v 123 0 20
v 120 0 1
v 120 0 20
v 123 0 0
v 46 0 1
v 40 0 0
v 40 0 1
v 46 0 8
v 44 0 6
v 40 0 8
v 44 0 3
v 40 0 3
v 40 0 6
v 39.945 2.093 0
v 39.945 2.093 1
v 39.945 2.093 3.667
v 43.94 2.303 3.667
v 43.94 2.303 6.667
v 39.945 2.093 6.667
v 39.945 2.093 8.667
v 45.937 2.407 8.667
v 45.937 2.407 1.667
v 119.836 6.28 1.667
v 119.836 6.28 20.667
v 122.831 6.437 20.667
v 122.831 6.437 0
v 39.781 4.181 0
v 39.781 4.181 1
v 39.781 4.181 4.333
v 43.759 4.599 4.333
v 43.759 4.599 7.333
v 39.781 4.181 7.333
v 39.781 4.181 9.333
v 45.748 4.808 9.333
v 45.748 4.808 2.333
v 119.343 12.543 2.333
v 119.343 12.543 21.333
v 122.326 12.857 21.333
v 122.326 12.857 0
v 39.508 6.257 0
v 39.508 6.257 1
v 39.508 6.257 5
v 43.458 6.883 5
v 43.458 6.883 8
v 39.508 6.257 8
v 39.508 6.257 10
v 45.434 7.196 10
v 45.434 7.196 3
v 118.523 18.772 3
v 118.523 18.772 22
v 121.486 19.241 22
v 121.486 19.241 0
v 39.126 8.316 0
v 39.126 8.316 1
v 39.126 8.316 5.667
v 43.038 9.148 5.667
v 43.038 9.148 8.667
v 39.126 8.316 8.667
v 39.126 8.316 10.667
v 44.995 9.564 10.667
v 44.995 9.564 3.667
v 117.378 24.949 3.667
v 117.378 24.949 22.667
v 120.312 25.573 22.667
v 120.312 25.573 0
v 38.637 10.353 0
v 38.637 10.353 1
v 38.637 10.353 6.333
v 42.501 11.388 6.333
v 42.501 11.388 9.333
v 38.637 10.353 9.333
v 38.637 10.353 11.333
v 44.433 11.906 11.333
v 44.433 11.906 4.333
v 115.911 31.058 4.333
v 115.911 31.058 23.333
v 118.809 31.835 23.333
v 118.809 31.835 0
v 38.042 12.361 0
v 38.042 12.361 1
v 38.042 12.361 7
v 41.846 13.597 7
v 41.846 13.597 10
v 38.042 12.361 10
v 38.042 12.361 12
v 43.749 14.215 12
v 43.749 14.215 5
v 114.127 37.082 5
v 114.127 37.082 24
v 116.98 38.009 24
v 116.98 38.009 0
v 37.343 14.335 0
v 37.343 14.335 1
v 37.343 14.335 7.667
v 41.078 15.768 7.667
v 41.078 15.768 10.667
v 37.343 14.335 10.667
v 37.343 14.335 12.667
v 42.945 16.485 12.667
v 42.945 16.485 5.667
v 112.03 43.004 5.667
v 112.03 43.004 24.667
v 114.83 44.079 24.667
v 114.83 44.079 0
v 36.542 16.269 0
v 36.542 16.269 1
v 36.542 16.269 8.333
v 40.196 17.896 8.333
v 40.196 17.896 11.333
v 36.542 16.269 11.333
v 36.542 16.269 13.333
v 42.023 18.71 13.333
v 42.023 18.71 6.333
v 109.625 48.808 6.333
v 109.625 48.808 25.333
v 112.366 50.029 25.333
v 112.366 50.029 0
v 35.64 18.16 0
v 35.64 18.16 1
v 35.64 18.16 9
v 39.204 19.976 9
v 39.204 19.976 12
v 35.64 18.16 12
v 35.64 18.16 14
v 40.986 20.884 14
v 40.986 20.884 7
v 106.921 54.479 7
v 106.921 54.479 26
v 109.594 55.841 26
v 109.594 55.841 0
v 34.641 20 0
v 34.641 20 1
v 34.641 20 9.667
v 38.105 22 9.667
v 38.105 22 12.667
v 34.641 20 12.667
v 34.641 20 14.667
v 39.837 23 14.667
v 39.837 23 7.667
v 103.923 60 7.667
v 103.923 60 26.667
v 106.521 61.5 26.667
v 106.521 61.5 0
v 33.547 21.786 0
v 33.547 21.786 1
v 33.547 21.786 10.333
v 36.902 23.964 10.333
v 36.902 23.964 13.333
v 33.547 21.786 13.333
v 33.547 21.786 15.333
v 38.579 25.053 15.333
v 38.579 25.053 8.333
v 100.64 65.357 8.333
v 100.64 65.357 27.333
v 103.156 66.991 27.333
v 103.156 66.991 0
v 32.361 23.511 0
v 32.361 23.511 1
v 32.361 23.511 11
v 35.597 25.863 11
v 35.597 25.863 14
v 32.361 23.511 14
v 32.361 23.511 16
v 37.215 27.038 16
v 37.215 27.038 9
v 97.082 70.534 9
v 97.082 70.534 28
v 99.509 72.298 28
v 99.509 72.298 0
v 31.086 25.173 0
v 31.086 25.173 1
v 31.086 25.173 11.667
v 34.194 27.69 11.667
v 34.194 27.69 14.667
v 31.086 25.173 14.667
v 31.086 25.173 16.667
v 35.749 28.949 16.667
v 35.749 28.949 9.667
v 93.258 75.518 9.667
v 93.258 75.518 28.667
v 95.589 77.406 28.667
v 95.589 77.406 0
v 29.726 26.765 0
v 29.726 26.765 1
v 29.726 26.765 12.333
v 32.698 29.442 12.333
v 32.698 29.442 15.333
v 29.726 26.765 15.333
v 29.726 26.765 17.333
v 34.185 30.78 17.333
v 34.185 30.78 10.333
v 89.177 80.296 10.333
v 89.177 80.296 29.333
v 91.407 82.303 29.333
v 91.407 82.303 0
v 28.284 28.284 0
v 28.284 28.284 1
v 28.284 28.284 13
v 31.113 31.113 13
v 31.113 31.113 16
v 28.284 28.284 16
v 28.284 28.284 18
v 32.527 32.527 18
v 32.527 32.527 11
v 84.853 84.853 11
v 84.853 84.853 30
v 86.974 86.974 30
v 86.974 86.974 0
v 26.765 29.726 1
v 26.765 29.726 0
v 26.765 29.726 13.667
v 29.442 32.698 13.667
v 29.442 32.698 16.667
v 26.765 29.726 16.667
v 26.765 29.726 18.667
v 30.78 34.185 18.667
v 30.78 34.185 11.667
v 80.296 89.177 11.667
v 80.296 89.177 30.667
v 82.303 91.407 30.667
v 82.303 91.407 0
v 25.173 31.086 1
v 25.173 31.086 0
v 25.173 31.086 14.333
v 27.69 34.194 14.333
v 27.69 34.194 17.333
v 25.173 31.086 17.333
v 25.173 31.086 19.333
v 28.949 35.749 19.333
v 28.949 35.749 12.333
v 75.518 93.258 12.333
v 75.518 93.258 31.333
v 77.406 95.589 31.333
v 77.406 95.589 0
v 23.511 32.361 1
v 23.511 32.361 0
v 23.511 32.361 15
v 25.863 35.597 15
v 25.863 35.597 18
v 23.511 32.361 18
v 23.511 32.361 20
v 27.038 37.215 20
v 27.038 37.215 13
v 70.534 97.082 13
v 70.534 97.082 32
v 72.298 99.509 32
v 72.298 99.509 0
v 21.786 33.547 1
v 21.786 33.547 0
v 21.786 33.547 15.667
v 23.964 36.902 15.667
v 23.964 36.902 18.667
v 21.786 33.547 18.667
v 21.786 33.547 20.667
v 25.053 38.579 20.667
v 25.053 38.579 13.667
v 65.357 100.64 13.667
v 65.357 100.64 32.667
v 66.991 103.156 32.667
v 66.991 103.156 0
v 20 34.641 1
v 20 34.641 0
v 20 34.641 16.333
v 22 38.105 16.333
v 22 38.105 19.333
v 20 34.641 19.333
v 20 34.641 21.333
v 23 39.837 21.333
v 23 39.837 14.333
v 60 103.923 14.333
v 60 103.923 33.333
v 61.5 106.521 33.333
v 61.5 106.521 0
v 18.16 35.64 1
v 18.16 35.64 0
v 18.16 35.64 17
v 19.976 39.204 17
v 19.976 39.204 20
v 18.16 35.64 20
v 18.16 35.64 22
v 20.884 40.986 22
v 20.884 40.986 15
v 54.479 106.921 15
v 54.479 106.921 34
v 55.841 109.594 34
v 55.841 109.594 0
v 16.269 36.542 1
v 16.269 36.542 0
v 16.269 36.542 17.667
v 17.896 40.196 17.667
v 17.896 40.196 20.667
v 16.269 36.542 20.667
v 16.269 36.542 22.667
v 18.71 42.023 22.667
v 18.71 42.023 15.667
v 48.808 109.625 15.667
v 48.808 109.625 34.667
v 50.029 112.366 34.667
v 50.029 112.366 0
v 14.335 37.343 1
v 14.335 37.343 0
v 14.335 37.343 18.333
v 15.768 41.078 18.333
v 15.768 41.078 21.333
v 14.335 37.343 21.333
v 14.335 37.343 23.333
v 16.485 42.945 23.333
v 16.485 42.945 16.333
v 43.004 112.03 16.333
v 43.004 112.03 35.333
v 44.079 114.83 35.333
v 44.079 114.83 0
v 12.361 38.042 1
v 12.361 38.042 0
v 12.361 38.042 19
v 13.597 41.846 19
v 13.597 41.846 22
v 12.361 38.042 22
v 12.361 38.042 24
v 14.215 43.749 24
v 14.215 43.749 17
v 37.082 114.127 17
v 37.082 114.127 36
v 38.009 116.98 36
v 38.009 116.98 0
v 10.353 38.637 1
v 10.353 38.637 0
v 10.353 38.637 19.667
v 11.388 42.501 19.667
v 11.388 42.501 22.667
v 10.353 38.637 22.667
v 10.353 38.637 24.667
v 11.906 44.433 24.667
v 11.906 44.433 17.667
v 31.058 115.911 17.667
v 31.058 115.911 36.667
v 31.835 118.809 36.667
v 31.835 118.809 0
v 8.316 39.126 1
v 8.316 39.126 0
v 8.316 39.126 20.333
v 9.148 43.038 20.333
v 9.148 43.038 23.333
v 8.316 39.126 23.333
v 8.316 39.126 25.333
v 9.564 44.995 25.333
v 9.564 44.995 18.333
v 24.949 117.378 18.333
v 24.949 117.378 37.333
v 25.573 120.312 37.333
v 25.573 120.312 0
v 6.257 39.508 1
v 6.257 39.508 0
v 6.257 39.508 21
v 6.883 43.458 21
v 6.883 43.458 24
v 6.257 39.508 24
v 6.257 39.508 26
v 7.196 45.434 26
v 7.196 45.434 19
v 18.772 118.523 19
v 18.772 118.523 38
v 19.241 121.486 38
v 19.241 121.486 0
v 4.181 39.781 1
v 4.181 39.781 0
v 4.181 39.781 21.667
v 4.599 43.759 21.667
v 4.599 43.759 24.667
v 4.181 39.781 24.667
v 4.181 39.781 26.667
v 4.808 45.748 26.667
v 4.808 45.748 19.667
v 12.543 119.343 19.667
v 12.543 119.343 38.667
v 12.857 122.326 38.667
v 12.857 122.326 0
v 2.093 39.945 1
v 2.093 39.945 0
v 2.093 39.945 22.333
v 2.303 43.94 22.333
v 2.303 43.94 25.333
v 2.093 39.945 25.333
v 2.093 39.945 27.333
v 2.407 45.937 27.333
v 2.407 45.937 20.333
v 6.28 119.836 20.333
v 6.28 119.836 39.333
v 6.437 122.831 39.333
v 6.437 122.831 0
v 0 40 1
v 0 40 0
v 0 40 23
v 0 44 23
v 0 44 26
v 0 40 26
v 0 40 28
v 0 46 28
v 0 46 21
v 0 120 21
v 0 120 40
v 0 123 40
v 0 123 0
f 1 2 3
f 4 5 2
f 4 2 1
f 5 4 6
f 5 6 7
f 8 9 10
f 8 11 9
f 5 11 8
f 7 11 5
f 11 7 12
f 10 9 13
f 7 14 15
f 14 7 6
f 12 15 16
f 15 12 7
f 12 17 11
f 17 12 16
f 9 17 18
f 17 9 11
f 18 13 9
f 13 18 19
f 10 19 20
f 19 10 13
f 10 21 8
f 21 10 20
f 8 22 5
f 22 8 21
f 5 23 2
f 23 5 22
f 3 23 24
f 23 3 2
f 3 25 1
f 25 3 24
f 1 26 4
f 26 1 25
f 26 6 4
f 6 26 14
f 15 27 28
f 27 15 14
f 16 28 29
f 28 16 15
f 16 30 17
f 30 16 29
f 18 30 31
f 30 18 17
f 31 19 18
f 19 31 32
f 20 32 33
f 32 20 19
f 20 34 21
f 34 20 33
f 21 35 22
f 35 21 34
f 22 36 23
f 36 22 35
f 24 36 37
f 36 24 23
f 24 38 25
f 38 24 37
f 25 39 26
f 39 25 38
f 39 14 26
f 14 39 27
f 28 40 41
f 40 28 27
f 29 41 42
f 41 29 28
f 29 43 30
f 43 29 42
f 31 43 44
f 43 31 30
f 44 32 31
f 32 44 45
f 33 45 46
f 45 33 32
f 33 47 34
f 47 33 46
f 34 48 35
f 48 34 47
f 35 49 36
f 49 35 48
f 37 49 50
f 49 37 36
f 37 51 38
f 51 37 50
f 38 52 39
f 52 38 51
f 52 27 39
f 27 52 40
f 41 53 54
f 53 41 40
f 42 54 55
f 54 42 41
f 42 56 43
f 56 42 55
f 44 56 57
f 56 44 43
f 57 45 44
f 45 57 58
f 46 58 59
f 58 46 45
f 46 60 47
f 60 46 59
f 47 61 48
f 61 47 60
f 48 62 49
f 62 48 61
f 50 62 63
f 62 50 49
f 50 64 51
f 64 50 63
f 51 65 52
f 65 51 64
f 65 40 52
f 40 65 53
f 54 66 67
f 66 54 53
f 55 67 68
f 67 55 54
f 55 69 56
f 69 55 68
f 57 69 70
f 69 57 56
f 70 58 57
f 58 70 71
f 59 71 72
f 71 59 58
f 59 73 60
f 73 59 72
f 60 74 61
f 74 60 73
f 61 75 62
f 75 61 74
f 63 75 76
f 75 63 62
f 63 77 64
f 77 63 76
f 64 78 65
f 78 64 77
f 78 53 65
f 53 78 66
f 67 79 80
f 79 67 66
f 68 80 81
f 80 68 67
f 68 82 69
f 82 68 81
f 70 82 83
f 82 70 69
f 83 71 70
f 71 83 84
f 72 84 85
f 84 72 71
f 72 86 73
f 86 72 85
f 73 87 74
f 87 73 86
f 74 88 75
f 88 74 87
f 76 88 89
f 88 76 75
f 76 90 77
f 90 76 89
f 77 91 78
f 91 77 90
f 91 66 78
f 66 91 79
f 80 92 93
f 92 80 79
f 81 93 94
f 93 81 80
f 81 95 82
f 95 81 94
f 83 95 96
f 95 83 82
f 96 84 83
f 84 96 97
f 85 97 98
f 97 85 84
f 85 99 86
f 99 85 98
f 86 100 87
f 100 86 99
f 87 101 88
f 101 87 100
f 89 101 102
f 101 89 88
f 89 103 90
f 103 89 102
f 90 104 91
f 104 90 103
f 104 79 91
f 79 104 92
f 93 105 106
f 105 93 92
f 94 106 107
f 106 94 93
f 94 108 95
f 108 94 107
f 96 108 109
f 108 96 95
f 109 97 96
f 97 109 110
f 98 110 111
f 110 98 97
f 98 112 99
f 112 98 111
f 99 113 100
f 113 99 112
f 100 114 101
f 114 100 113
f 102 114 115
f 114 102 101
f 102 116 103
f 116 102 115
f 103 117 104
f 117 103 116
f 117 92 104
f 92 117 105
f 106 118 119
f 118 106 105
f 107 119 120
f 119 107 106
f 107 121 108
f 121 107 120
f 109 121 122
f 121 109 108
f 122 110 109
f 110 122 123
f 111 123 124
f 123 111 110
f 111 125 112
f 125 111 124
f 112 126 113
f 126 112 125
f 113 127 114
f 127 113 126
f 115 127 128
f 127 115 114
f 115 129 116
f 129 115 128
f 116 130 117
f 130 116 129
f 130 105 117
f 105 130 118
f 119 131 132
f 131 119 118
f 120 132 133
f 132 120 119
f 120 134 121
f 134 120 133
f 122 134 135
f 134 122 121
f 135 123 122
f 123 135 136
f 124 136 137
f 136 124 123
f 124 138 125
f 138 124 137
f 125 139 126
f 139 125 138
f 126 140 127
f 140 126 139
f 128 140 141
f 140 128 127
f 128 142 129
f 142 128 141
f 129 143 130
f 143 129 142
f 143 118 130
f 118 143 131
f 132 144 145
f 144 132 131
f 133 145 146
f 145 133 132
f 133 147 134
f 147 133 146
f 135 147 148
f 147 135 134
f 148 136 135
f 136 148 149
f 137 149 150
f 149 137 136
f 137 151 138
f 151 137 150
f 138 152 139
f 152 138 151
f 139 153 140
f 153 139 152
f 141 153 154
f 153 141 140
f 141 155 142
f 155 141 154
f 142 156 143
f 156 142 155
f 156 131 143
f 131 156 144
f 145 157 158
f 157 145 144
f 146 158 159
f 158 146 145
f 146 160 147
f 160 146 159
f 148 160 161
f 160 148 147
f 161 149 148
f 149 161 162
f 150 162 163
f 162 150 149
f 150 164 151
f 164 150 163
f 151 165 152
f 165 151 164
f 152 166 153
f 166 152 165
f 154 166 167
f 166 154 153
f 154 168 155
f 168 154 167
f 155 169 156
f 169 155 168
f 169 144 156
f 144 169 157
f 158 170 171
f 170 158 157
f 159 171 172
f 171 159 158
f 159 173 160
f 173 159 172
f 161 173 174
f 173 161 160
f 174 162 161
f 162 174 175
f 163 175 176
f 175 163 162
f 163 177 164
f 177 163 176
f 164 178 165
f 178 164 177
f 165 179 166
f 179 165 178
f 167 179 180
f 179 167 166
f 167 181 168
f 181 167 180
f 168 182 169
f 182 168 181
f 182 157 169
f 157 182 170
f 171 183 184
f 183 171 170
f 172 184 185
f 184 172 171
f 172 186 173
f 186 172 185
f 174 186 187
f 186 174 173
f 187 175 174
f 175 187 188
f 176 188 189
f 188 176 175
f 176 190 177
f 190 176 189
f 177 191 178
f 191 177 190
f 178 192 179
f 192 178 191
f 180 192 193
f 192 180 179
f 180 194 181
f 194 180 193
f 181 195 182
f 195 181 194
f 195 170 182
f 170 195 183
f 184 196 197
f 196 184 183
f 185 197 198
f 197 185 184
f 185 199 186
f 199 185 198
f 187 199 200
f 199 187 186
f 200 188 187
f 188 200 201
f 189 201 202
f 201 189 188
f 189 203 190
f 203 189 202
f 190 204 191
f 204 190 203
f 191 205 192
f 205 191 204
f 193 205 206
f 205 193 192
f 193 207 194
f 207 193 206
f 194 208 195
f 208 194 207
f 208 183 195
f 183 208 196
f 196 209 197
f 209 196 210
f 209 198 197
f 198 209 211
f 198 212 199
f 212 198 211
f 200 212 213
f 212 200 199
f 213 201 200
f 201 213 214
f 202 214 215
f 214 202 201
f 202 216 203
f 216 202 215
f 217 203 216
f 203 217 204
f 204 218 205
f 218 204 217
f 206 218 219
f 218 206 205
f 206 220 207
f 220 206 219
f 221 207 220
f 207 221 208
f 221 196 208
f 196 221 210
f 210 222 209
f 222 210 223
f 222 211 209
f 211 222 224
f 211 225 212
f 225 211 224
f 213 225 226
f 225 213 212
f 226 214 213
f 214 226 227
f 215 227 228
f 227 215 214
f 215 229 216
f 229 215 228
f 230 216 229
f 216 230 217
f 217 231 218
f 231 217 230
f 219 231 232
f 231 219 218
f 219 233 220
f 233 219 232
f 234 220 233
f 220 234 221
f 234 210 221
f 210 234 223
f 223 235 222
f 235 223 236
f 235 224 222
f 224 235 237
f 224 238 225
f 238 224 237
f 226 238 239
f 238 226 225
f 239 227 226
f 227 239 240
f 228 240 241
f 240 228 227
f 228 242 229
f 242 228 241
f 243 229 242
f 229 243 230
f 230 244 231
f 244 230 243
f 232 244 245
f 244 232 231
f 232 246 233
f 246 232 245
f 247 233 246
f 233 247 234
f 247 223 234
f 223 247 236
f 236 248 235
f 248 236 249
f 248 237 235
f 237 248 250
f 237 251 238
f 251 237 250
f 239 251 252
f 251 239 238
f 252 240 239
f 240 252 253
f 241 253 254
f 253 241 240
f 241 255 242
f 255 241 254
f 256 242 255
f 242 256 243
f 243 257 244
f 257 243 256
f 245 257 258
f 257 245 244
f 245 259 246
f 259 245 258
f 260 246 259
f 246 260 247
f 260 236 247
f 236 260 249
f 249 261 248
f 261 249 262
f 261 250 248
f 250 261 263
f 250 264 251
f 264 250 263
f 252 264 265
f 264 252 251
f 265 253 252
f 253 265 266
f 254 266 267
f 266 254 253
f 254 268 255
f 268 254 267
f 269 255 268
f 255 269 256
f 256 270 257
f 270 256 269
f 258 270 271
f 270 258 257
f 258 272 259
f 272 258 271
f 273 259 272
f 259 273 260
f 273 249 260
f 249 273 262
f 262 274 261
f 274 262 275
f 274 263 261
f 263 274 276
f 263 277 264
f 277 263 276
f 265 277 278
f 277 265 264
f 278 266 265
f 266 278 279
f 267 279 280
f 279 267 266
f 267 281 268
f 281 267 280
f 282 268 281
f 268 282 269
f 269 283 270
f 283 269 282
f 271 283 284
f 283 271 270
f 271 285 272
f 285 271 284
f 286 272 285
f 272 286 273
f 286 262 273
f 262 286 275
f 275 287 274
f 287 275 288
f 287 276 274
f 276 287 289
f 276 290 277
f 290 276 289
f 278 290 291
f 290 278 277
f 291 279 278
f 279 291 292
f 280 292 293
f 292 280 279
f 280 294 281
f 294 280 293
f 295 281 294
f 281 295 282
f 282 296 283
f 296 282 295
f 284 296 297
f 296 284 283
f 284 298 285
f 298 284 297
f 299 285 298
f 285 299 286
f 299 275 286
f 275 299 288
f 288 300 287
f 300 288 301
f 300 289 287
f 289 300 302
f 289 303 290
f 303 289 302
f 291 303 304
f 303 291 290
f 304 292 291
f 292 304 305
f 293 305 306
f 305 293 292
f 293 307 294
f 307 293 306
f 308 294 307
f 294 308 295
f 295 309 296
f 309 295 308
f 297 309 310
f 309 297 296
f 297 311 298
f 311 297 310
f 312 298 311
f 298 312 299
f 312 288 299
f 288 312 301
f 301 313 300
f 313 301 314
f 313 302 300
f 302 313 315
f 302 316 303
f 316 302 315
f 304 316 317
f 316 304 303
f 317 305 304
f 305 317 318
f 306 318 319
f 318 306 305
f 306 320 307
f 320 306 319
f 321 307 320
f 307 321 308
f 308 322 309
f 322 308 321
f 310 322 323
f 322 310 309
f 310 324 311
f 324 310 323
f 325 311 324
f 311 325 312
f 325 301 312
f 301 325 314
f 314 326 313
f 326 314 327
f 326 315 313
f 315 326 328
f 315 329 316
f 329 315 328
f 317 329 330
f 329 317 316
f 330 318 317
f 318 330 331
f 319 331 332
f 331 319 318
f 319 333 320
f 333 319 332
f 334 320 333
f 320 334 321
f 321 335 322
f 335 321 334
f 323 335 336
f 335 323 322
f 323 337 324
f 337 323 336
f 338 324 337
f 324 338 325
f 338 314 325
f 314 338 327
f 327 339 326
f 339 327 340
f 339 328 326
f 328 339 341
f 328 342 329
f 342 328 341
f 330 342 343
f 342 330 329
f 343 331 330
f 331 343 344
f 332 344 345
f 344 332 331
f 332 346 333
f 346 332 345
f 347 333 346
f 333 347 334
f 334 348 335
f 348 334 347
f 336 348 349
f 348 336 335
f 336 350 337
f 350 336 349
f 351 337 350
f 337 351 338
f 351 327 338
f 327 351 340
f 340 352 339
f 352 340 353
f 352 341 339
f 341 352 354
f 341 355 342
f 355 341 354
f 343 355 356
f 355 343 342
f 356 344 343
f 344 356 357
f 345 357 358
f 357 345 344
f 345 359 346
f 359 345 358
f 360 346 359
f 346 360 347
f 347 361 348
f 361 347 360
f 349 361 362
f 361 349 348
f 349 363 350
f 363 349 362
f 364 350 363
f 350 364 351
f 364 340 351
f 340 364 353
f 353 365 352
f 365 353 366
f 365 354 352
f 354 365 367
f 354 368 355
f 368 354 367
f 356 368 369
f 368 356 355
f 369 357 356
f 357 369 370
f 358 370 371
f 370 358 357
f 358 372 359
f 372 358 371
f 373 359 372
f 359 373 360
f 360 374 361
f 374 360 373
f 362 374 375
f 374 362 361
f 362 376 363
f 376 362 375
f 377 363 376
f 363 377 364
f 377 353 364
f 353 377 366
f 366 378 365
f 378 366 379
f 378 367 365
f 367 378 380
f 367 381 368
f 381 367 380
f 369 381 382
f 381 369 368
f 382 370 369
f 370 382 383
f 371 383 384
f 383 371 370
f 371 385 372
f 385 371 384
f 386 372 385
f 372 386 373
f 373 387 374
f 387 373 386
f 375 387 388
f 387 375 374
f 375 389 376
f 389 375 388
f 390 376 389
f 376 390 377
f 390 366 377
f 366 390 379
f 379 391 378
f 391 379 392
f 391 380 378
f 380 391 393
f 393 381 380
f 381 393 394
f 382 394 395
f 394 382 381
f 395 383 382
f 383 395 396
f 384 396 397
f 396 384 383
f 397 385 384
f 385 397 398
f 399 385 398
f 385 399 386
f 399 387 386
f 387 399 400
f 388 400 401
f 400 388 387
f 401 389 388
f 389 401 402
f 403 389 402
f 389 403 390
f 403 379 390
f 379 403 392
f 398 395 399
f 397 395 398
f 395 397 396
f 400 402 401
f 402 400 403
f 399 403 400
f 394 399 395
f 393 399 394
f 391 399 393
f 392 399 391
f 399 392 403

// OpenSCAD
SphereRadius = 36;

$fn = 72;

InnerRadius = 40;
LidThickness = 2;
LidDepth = 6;
GapThickness = 3;
GapDepth = 4;
RampDepth = 8;
RampWidth = SphereRadius*2 + 2;
MaxHeight = 20;
OuterHeight = 20;
OuterDepth = 3;

SliceAngle = 3;
Slices = 90/SliceAngle;


FixedCrossSection = [[InnerRadius, 0, 0],
                     [InnerRadius, 1, 0],
                     [InnerRadius, RampDepth-(LidThickness+GapThickness), 1],
                     [InnerRadius+GapDepth, RampDepth-(LidThickness+GapThickness), 1],
                     [InnerRadius+GapDepth, RampDepth-LidThickness, 1],
                     [InnerRadius, RampDepth-LidThickness, 1],
                     [InnerRadius, RampDepth, 1],
                     [InnerRadius + LidDepth, RampDepth, 1],           
                     [InnerRadius + LidDepth,  1, 1],                       
                     [InnerRadius + LidDepth + RampWidth, 1, 1],                      
                     [InnerRadius + LidDepth + RampWidth, OuterHeight, 1],  
                     [InnerRadius + LidDepth + RampWidth + OuterDepth, OuterHeight, 1],  
                     [InnerRadius + LidDepth + RampWidth + OuterDepth, 0, 0]];

function Point(i) = [FixedCrossSection[i][0],
                     FixedCrossSection[i][1] + FixedCrossSection[i][2] * MaxHeight];


function Slice(angle, i) =
    let (dx = cos(angle) * FixedCrossSection[i][0])
    let (dy = sin(angle) * FixedCrossSection[i][0])
    let (h = MaxHeight * angle / 90)
        [dx, dy, FixedCrossSection[i][1] + FixedCrossSection[i][2] * h];
function Face(angle, i) =
    let (index = (angle/SliceAngle))
    let (s0 = index * len(FixedCrossSection))
    let (p0 = s0 + i)
    let (p1 = s0 + (i + 1) % len(FixedCrossSection))
    let (s1 = (index + 1) * len(FixedCrossSection))
    let (p2 = s1 + (i + 1) % len(FixedCrossSection))
    let (p3 = s1 + i)
    [p0,p1,p2,p3];
        
        
//polygon([for (i = [0:len(FixedCrossSection)-1]) Point(i)]);
p = [for (angle = [0:SliceAngle:90])
        for (i = [0:len(FixedCrossSection)-1])
            Slice(angle, i)];
                
f = [[for (i = [len(FixedCrossSection)-1:-1:0]) i],
     for (angle = [0:SliceAngle:90-SliceAngle])
        for (i = [0:len(FixedCrossSection)-1])
            Face(angle, i),
      [for (i = [0:len(FixedCrossSection)-1]) i + Slices*len(FixedCrossSection)]];
echo(p);

echo(f);

union() {
/*
difference() {
    translate([-(RampWidth+3), InnerRadius,0])
    cube([RampWidth+3,RampWidth+LidDepth+OuterDepth,MaxHeight+OuterHeight]);
    translate([-RampWidth, InnerRadius + LidDepth,3])
        cube([RampWidth,RampWidth,MaxHeight+OuterHeight+1]);
}
    */
polyhedron(
    points = p,
    faces = f,
    convexity = 10);
}
                  
                
    


module Arc(outerRadius, thickness, length, height)
{
    radius = outerRadius-thickness/2;
    innerRadius = outerRadius - thickness;
    translate([-radius,0,0]) {
        angle = length * 180 / (radius * 3.141592654);
        x = cos(angle) * radius;
        y = sin(angle) * radius;

        union() {
            translate([x,y,0])
                cylinder(r=thickness/2, h=height);
            translate([radius,0,0])
                cylinder(r=thickness/2, h=height);
            intersection() {
                HollowCylinder(innerRadius, outerRadius, height);

                translate([0,0,-1])
                    linear_extrude(height = height + 2)
                        polygon([[0,0],[2*radius,0],
                                 [2*radius,2*radius],
                                 if (angle > 90)
                                    [-2*radius,2*radius],
                                 if (angle > 180)
                                    [-2*radius,-2*radius],
                                 if (angle > 270)
                                    [2*radius,-2*radius],
                                 [2*x,2*y]]);
            }
        }
    }
}
module HollowCylinder(innerRadius, outerRadius, height)
{
    difference()
    {
        cylinder(r=outerRadius, h=height, $fn = 288);
        translate([0,0,-1])
            cylinder(r=innerRadius, h=height + 2, $fn = 288);
    }
}
